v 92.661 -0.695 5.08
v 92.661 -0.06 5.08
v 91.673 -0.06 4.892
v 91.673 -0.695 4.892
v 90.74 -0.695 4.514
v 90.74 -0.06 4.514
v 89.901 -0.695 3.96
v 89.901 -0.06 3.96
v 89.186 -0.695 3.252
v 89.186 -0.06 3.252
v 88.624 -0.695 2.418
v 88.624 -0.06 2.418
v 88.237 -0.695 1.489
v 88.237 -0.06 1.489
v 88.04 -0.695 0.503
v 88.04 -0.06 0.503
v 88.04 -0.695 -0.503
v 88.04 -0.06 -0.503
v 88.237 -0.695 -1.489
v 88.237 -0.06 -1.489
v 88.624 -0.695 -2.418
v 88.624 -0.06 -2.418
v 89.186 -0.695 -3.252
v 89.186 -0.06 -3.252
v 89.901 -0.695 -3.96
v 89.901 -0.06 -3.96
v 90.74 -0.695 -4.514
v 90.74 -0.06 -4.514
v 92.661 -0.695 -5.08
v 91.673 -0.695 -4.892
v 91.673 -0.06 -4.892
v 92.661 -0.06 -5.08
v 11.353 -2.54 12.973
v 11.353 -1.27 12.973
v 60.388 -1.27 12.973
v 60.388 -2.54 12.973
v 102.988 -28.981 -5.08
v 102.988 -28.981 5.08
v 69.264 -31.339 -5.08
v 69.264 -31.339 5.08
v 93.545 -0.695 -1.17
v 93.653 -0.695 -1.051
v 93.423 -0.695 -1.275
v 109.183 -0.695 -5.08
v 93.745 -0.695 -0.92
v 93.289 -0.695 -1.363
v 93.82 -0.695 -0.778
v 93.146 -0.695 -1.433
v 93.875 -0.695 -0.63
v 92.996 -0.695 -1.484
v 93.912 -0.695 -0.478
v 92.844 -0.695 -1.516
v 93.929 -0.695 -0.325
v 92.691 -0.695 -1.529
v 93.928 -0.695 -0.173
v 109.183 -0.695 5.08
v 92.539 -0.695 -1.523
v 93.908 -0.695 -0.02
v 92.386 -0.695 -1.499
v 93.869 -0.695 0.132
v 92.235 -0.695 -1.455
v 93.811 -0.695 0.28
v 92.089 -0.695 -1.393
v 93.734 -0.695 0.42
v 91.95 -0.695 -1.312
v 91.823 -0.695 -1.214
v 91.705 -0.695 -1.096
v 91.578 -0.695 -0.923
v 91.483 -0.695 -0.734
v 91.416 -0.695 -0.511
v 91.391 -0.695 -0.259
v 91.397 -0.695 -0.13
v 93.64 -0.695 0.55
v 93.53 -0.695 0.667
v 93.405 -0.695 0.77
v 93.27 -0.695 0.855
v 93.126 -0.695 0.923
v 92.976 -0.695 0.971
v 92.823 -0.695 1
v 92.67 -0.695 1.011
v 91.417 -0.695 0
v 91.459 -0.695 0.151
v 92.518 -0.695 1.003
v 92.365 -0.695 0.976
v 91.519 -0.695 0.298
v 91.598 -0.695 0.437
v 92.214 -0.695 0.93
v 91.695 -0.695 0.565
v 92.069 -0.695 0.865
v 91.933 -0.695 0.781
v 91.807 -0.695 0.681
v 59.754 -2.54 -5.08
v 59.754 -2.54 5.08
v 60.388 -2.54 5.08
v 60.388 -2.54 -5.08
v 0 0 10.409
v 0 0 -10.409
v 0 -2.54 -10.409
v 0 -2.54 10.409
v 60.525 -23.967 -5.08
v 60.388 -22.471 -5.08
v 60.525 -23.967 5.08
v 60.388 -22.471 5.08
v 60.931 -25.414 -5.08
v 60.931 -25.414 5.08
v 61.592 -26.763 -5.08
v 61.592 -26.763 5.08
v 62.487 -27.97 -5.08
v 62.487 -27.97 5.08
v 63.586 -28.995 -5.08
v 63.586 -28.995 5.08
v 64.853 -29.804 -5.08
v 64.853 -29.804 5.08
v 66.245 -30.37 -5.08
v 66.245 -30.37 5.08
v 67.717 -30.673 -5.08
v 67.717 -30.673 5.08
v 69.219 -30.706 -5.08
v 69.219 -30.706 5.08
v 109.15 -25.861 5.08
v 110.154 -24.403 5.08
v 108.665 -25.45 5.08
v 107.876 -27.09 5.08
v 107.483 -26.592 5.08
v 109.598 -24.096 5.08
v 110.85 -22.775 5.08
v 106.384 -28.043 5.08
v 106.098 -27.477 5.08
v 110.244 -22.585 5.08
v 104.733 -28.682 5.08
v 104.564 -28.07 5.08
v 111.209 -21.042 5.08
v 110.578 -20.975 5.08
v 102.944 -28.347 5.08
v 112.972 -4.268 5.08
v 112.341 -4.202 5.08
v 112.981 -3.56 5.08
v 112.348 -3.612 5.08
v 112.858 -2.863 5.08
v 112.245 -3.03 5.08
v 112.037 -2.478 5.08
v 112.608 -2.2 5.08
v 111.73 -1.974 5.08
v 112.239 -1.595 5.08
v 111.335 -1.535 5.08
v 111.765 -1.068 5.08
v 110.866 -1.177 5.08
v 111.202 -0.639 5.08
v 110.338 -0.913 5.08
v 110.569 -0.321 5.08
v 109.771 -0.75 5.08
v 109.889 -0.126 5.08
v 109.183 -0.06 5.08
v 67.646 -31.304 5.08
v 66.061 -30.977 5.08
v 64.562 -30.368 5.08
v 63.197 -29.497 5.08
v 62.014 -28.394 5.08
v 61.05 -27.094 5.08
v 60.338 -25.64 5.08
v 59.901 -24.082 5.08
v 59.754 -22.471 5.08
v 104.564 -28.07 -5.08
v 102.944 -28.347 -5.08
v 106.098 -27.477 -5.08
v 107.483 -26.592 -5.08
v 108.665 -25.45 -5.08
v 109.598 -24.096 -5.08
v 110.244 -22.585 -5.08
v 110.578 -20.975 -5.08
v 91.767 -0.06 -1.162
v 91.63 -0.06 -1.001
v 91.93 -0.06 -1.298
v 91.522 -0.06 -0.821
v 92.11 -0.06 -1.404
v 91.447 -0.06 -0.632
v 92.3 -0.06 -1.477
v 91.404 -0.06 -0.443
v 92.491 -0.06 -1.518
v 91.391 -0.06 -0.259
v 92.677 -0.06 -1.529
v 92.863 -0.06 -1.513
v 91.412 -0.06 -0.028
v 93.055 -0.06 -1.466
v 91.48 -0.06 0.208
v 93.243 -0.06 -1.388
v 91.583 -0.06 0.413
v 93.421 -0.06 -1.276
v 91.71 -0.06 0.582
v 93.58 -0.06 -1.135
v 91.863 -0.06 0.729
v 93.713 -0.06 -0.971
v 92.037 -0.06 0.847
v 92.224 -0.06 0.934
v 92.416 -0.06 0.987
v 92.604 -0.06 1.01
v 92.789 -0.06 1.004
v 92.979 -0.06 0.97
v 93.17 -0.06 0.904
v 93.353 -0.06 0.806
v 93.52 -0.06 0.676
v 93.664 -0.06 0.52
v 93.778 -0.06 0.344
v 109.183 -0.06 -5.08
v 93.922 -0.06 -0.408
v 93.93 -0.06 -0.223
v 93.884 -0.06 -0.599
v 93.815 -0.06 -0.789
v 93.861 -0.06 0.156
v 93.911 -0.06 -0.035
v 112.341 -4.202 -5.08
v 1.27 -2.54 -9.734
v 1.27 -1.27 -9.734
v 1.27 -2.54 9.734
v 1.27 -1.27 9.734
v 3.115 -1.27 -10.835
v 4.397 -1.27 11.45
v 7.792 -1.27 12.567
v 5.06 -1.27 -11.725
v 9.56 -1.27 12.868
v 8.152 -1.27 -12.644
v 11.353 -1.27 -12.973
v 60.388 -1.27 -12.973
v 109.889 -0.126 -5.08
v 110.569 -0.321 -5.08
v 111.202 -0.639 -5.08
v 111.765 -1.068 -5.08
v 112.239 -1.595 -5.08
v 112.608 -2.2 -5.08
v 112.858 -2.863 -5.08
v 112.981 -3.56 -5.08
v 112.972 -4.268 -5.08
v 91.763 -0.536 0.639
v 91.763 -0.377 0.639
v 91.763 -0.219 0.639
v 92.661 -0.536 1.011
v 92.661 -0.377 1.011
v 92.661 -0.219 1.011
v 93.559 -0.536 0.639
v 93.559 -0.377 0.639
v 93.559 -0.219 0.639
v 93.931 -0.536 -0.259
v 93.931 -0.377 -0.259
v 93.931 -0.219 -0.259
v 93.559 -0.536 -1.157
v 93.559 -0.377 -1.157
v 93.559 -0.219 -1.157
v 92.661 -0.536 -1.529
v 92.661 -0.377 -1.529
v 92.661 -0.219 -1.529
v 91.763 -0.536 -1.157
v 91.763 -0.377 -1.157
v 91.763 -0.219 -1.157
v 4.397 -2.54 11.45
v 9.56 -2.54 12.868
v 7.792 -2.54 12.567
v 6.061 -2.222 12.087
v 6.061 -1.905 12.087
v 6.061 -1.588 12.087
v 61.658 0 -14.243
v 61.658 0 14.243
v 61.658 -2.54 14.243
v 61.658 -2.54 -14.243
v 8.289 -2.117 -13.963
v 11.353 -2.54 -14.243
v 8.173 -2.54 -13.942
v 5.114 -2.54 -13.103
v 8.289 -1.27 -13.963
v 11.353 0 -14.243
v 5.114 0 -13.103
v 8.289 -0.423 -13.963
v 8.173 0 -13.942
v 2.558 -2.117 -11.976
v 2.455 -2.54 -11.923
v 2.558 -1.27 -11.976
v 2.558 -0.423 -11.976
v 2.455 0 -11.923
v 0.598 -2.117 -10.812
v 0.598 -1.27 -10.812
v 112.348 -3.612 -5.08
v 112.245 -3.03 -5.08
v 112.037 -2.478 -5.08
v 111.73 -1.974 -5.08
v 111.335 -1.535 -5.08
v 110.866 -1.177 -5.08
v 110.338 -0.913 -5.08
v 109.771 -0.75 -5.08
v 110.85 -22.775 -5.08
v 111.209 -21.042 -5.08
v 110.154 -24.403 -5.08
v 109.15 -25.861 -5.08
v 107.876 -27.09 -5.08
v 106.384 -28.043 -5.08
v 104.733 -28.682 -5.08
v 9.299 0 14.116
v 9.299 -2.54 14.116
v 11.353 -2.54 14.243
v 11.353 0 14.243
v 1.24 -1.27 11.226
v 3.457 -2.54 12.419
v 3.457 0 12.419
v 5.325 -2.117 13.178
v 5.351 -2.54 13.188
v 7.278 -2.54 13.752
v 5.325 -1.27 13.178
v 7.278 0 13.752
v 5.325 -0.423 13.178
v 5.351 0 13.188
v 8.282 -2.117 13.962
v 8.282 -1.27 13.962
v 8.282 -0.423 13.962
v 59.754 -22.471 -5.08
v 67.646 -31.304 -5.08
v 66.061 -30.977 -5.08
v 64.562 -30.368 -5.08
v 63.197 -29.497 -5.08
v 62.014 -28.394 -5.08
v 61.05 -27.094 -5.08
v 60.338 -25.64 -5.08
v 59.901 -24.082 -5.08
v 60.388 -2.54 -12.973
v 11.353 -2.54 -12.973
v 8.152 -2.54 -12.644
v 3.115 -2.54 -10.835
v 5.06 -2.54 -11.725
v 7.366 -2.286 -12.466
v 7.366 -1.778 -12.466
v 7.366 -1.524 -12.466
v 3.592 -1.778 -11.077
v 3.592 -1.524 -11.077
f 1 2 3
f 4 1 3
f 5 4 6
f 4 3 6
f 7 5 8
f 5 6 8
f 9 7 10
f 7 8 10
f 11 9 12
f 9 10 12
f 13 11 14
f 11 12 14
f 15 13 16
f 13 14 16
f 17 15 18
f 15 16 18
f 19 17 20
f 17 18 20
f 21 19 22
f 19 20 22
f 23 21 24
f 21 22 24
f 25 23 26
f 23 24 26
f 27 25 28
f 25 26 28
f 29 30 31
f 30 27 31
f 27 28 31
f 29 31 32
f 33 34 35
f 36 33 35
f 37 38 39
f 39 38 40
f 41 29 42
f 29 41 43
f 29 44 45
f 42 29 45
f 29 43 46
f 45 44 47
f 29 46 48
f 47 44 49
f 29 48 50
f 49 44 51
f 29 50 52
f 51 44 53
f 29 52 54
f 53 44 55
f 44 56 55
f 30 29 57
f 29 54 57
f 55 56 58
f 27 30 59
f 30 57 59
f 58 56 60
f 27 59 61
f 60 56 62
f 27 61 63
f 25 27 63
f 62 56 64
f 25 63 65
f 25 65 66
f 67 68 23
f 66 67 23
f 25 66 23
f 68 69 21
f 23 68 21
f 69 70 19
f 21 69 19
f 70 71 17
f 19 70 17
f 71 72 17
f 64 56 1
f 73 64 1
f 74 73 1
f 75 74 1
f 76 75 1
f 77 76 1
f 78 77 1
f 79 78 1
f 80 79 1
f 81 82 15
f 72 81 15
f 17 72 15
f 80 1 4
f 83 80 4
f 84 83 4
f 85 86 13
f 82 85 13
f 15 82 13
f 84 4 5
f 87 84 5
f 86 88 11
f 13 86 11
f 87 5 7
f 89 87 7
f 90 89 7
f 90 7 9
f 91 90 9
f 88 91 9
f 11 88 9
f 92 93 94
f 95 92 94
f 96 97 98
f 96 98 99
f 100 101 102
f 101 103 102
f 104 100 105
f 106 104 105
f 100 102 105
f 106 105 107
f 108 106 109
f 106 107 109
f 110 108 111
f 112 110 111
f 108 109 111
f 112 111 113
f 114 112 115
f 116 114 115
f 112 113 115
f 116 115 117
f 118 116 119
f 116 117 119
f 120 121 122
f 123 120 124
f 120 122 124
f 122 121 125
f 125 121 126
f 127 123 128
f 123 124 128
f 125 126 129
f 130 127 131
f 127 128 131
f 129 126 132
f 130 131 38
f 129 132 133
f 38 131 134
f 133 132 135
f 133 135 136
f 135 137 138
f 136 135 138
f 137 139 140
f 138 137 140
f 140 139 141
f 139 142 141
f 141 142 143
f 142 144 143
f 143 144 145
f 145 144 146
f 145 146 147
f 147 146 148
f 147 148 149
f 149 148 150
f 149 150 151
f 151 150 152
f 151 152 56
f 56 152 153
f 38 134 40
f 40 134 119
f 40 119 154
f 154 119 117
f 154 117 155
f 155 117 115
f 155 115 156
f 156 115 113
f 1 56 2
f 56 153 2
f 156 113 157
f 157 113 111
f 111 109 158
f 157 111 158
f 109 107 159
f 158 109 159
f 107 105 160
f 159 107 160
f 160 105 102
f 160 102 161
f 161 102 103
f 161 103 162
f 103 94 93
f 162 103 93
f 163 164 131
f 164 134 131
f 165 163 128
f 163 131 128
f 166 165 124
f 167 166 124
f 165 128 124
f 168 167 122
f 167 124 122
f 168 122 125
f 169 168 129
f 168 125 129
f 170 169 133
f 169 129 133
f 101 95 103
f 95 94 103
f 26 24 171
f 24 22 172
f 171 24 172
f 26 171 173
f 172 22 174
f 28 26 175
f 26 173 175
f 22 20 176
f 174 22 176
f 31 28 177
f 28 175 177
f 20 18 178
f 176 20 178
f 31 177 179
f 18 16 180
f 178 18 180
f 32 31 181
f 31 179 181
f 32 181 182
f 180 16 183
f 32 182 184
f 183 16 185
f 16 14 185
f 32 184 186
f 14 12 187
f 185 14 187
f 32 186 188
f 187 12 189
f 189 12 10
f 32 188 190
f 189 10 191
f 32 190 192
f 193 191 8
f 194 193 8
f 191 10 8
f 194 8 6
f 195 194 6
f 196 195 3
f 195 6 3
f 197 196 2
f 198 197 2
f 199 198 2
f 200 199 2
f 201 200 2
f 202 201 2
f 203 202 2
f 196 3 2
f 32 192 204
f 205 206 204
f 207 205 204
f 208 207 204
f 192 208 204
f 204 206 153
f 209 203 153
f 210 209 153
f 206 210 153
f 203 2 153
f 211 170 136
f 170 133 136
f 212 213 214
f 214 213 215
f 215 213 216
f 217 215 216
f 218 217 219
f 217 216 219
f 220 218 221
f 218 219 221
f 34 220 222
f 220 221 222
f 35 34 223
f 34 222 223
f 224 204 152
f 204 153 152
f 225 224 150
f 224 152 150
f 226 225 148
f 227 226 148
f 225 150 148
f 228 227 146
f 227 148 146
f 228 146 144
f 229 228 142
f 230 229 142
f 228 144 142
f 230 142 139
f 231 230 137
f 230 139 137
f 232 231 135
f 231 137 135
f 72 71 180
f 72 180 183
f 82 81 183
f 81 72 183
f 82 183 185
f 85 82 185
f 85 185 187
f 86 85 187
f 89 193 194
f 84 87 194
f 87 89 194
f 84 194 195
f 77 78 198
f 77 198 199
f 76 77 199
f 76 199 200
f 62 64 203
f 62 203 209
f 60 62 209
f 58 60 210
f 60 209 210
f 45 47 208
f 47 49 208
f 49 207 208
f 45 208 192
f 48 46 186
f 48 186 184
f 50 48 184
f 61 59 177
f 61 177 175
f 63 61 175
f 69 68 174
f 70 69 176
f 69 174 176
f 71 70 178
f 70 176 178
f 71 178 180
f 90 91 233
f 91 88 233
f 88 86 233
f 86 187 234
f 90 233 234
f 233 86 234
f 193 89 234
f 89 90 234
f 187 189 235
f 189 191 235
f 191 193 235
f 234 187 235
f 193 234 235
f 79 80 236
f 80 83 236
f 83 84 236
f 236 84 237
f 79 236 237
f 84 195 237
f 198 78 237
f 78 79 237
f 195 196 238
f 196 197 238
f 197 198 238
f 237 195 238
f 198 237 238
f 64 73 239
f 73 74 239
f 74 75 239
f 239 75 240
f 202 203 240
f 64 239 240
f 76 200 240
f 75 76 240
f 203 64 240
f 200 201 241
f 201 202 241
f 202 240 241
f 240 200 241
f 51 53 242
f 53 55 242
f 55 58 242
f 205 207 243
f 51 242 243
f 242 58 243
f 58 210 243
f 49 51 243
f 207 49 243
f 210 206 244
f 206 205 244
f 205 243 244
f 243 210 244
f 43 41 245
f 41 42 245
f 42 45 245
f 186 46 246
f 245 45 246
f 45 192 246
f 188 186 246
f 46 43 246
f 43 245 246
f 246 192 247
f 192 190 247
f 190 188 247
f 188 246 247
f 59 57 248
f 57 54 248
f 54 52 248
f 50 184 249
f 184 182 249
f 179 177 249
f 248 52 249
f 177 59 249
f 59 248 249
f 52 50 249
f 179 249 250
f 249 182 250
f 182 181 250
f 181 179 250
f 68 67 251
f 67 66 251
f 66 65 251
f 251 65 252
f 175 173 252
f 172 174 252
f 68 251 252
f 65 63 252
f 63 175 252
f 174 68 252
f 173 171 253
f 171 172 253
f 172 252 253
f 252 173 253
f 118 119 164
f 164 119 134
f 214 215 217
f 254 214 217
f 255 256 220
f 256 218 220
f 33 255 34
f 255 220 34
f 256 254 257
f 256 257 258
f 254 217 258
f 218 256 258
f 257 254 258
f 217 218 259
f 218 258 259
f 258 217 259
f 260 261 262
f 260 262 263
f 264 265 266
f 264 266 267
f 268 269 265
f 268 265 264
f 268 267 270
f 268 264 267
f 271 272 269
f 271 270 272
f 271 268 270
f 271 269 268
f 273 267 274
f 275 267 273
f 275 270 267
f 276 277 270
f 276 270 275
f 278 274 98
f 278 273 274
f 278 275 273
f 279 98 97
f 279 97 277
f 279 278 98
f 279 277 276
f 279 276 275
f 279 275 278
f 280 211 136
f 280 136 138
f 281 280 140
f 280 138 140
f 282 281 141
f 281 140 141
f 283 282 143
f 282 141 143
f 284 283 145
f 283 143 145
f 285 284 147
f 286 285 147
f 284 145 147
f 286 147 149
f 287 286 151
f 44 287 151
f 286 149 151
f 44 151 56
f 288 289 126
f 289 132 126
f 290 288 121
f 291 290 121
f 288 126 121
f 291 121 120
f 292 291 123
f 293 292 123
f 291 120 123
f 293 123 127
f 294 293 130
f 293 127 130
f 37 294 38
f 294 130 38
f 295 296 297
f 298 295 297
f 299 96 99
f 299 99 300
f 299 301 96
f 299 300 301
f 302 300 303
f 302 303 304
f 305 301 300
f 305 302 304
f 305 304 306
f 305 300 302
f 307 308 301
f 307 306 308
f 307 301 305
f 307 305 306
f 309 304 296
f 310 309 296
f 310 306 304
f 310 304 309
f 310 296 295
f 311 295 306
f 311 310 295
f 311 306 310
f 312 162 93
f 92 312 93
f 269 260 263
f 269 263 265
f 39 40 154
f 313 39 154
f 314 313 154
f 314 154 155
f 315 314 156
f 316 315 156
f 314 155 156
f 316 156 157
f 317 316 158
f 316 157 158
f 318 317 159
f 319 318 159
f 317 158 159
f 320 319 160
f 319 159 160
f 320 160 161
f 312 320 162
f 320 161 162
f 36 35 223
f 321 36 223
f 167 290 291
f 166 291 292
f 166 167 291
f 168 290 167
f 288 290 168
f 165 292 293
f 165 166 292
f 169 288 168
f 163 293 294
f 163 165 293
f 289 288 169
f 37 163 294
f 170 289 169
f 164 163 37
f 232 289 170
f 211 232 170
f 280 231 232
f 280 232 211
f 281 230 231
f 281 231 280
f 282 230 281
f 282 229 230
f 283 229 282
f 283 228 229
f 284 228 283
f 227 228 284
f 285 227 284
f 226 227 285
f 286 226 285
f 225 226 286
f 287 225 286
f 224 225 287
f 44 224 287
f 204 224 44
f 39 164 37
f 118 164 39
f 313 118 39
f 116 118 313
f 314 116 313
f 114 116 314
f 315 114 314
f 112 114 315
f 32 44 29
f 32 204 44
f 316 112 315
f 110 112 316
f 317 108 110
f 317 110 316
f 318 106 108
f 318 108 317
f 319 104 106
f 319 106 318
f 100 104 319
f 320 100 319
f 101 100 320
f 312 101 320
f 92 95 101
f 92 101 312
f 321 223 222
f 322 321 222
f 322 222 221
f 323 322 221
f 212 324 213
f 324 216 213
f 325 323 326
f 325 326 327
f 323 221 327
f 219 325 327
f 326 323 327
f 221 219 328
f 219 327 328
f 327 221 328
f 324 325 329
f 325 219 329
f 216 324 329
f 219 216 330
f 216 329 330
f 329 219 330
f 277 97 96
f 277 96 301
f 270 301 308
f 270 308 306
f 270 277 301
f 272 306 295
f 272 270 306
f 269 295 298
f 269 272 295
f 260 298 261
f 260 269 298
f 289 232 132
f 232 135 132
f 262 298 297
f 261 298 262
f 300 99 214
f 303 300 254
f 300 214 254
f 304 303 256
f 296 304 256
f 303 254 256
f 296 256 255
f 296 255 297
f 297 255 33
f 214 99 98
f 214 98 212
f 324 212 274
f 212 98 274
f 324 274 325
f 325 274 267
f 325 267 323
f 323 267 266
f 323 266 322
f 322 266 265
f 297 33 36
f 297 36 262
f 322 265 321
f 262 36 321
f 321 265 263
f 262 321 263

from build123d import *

# Parameters (mm, degrees)
BOSS_EXTRUDE1_DEPTH = 2.54
BOSS_EXTRUDE2_DEPTH = 1.27
BOSS_EXTRUDE4_DEPTH = 5.08
CUT_EXTRUDE1_DEPTH  = 10.16


with BuildPart() as part:
    # Sketch2 → Boss-Extrude1 (new body)
    with BuildSketch(Plane(origin=(0, 0, 0), x_dir=(1, 0, 0), z_dir=(0, 1, 0))):
        with BuildLine():
            Line((61.6585, 14.24305), (11.353119278, 14.24305))
            add(Edge.make_bspline(
                [(11.353119278, 14.24305), (10.327450576, 14.24305), (8.268396325, 14.047212971), (5.302466499, 13.251177888), (2.984919751, 12.238407997), (1.457568956, 11.373573602), (0.585224181, 10.807442935), (0.199247928, 10.543156277), (0, 10.408643815)],
                knots=[0, 0, 0, 0, 0.26559717, 0.53119434, 0.79679151, 0.929590095, 0.995989388, 1.06238868, 1.06238868, 1.06238868, 1.06238868], degree=3))
            Line((0, 10.408643815), (0, -10.408643815))
            add(Edge.make_bspline(
                [(0, -10.408643815), (0.199362689, -10.543233752), (0.585625006, -10.807716475), (1.458093765, -11.373904113), (2.984771936, -12.238095031), (5.290743108, -13.246690496), (8.260791434, -14.04631859), (10.325095436, -14.24305), (11.353119278, -14.24305)],
                knots=[-0.062352625, -0.062352625, -0.062352625, -0.062352625, 0.004044414, 0.070441453, 0.203235531, 0.468823688, 0.734411844, 1, 1, 1, 1], degree=3))
            Line((11.353119278, -14.24305), (61.6585, -14.24305))
            Line((61.6585, -14.24305), (61.6585, 14.24305))
        make_face()
        with BuildLine():
            Line((60.3885, 12.97305), (11.353119278, 12.97305))
            add(Edge.make_bspline(
                [(11.353119278, 12.97305), (10.450059292, 12.97305), (9.559200274, 12.892260342), (8.238540183, 12.667590961), (7.800947814, 12.575301907), (6.93079857, 12.357380879), (6.496809339, 12.231215794), (5.217581339, 11.809076607), (4.392169756, 11.469786786), (2.792058433, 10.684140853), (2.017192827, 10.23813493), (1.27, 9.733704358)],
                knots=[0, 0, 0, 0, 0.25, 0.25, 0.375, 0.375, 0.5, 0.5, 0.75, 0.75, 1, 1, 1, 1], degree=3))
            Line((1.27, 9.733704358), (1.27, -9.733704358))
            add(Edge.make_bspline(
                [(1.27, -9.733704358), (2.017624891, -10.238426616), (2.791972237, -10.684006715), (4.38895342, -11.46829921), (5.211756448, -11.806637152), (6.90950361, -12.3679143), (7.789205877, -12.590836152), (9.556782483, -12.892161488), (10.449674156, -12.97305), (11.353119278, -12.97305)],
                knots=[0, 0, 0, 0, 0.25, 0.25, 0.5, 0.5, 0.75, 0.75, 1, 1, 1, 1], degree=3))
            Line((11.353119278, -12.97305), (60.3885, -12.97305))
            Line((60.3885, -12.97305), (60.3885, 12.97305))
        make_face(mode=Mode.SUBTRACT)
    extrude(amount=-BOSS_EXTRUDE1_DEPTH)

    # Sketch3 → Boss-Extrude2 (add)
    with BuildSketch(Plane(origin=(0, 0, 0), x_dir=(1, 0, 0), z_dir=(0, 1, 0))):
        with BuildLine():
            Line((60.3885, 12.97305), (11.353119278, 12.97305))
            add(Edge.make_bspline(
                [(11.353119278, 12.97305), (10.450059292, 12.97305), (9.559200274, 12.892260342), (8.238540183, 12.667590961), (7.800947814, 12.575301907), (6.93079857, 12.357380879), (6.496809339, 12.231215794), (5.217581339, 11.809076607), (4.392169756, 11.469786786), (2.792058433, 10.684140853), (2.017192827, 10.23813493), (1.27, 9.733704358)],
                knots=[0, 0, 0, 0, 0.25, 0.25, 0.375, 0.375, 0.5, 0.5, 0.75, 0.75, 1, 1, 1, 1], degree=3))
            Line((1.27, 9.733704358), (1.27, -9.733704358))
            add(Edge.make_bspline(
                [(1.27, -9.733704358), (2.017624891, -10.238426616), (2.791972237, -10.684006715), (4.38895342, -11.46829921), (5.211756448, -11.806637152), (6.90950361, -12.3679143), (7.789205877, -12.590836152), (9.556782483, -12.892161488), (10.449674156, -12.97305), (11.353119278, -12.97305)],
                knots=[0, 0, 0, 0, 0.25, 0.25, 0.5, 0.5, 0.75, 0.75, 1, 1, 1, 1], degree=3))
            Line((11.353119278, -12.97305), (60.3885, -12.97305))
            Line((60.3885, -12.97305), (60.3885, 12.97305))
        make_face()
    extrude(amount=-BOSS_EXTRUDE2_DEPTH)


with BuildPart() as body_2:
    # Sketch4 → Boss-Extrude4 (new, symmetric)
    with BuildSketch(Plane.XY):
        with BuildLine():
            Line((59.7535, -2.54), (60.3885, -2.54))
            Line((60.3885, -2.54), (60.3885, -3.175))
            Line((60.3885, -3.175), (60.3885, -22.470642168))
            ThreePointArc((60.3885, -22.470642168), (63.013603538, -28.507966975), (69.219339691, -30.705533403))
            Line((69.219339691, -30.705533403), (102.944033871, -28.347273055))
            ThreePointArc((102.944033871, -28.347273055), (108.102599029, -26.050531872), (110.577972427, -20.975264284))
            Line((110.577972427, -20.975264284), (112.340926379, -4.201877871))
            ThreePointArc((112.340926379, -4.201877871), (111.542804182, -1.745510325), (109.183319361, -0.695))
            Line((109.183319361, -0.695), (88.014753042, -0.695))
            Line((88.014753042, -0.695), (88.014753042, -0.06))
            Line((88.014753042, -0.06), (109.183319361, -0.06))
            ThreePointArc((109.183319361, -0.06), (112.014701146, -1.32061239), (112.972447782, -4.268253445))
            Line((112.972447782, -4.268253445), (111.209493831, -21.041639859))
            ThreePointArc((111.209493831, -21.041639859), (108.543707094, -26.507312645), (102.988329232, -28.980726227))
            Line((102.988329232, -28.980726227), (69.263635052, -31.338986575))
            ThreePointArc((69.263635052, -31.338986575), (62.580534579, -28.972376575), (59.7535, -22.470642168))
            Line((59.7535, -22.470642168), (59.7535, -2.54))
        make_face()
    extrude(amount=BOSS_EXTRUDE4_DEPTH, both=True)

    # Sketch5 → Cut-Extrude1 (cut)
    with BuildSketch(Plane(origin=(0, -0.06, 0), x_dir=(1, 0, 0), z_dir=(0, 1, 0))):
        with BuildLine():
            Line((92.660699692, 5.08), (92.660699692, 6.643453505))
            Line((92.660699692, 6.643453505), (85.053554135, 6.643453505))
            Line((85.053554135, 6.643453505), (85.053554135, -6.84888771))
            Line((85.053554135, -6.84888771), (92.660699692, -6.84888771))
            Line((92.660699692, -6.84888771), (92.660699692, -5.08))
            ThreePointArc((92.660699692, -5.08), (88.014753042, 0), (92.660699692, 5.08))
        make_face()
        with BuildLine():
            add(Edge.make_bspline(
                [(93.930699692, 0.259119976), (93.930699692, 1.529114058), (92.660699692, 1.529114058), (91.390699692, 1.529114058), (91.390699692, 0.259119976)],
                knots=[3.141592654, 3.141592654, 3.141592654, 4.71238898, 4.71238898, 6.283185307, 6.283185307, 6.283185307], degree=2, weights=[1, 0.707106781, 1, 0.707106781, 1]))
            add(Edge.make_bspline(
                [(91.390699692, 0.259119976), (91.390699692, -1.010874106), (92.660699692, -1.010874106), (93.930699692, -1.010874106), (93.930699692, 0.259119976)],
                knots=[0, 0, 0, 1.570796327, 1.570796327, 3.141592654, 3.141592654, 3.141592654], degree=2, weights=[1, 0.707106781, 1, 0.707106781, 1]))
        make_face()
    extrude(amount=-CUT_EXTRUDE1_DEPTH, mode=Mode.SUBTRACT)


solid = Compound([part.part, body_2.part])
